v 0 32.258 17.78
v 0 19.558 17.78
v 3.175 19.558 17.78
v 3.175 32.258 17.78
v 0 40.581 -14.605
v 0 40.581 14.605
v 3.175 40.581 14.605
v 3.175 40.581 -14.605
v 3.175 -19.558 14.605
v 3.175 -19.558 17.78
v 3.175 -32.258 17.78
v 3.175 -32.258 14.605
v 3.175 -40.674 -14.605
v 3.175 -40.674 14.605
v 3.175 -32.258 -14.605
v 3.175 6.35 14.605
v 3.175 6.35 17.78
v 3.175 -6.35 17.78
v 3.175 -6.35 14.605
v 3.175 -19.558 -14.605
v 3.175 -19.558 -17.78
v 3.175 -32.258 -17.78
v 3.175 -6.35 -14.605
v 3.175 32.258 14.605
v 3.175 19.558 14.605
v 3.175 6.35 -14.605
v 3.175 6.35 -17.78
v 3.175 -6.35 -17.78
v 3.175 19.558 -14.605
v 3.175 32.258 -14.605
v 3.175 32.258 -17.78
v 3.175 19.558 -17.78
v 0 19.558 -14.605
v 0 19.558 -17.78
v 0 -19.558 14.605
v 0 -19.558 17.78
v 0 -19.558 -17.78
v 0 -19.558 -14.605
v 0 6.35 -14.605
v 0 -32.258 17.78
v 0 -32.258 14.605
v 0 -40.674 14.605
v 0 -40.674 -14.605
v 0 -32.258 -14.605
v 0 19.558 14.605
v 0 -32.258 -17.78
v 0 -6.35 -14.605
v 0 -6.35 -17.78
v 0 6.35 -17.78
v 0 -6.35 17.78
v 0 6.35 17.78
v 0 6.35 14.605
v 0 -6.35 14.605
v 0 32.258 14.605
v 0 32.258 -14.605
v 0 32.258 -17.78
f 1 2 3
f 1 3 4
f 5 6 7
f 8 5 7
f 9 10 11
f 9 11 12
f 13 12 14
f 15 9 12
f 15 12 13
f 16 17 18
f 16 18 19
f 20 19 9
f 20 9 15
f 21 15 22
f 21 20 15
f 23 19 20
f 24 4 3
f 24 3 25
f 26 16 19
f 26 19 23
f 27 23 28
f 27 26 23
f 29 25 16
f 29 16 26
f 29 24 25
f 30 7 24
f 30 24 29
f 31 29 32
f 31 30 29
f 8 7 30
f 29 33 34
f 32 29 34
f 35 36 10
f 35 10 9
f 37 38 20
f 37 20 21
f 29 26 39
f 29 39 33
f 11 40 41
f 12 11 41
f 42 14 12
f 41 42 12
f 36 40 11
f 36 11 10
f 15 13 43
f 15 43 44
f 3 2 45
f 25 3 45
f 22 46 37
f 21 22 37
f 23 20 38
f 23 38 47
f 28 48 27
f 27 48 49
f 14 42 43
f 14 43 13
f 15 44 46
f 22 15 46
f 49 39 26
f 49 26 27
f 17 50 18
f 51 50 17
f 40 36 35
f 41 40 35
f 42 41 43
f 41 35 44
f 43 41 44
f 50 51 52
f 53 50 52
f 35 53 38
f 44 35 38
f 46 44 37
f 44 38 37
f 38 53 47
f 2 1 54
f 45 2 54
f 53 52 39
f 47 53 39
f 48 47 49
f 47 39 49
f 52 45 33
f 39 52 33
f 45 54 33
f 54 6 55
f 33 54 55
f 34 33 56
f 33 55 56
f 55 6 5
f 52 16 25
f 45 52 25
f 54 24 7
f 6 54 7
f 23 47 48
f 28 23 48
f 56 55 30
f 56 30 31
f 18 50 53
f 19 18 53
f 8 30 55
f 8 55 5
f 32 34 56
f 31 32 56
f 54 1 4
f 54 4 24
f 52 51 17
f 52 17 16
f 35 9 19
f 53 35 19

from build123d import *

# Parameters (mm, degrees)
SKETCH1_W          = 35.56
SKETCH1_H          = 90.932
EXTRUDE1_DEPTH     = 3.175
SKETCH2_W          = 3.175
SKETCH2_H          = 13.208
CUT_EXTRUDE1_DEPTH = 4.175
SKETCH3_W          = 3.175
SKETCH3_H          = 4.885047255
SKETCH3_H_2        = 4.792331668
CUT_EXTRUDE2_DEPTH = 33.385


with BuildPart() as part:
    # Sketch1 → Extrude1 (new body)
    with BuildSketch(Plane(origin=(0, 0, 0), x_dir=(0, 0, -1), z_dir=(1, 0, 0))):
        Rectangle(SKETCH1_W, SKETCH1_H)
    extrude(amount=EXTRUDE1_DEPTH)

    # Sketch2 → Cut-Extrude1 (cut, through all)
    with BuildSketch(Plane(origin=(3.175, 0, 0), x_dir=(0, 0, -1), z_dir=(1, 0, 0))):
        with Locations((-16.1925, 38.862)):
            Rectangle(SKETCH2_W, SKETCH2_H)
        with Locations((-16.1925, 12.954)):
            Rectangle(SKETCH2_W, SKETCH2_H)
        with Locations((-16.1925, -12.954)):
            Rectangle(SKETCH2_W, SKETCH2_H)
        with Locations((-16.1925, -38.862)):
            Rectangle(SKETCH2_W, SKETCH2_H)
        with Locations((-16.1925, -64.77)):
            Rectangle(SKETCH2_W, SKETCH2_H)
        with Locations((16.1925, -38.862)):
            Rectangle(SKETCH2_W, SKETCH2_H)
        with Locations((16.1925, -12.954)):
            Rectangle(SKETCH2_W, SKETCH2_H)
        with Locations((16.1925, 12.954)):
            Rectangle(SKETCH2_W, SKETCH2_H)
        with Locations((16.1925, 38.862)):
            Rectangle(SKETCH2_W, SKETCH2_H)
    extrude(amount=-CUT_EXTRUDE1_DEPTH, mode=Mode.SUBTRACT)

    # Sketch3 → Cut-Extrude2 (cut, through all)
    with BuildSketch(Plane.XY.offset(14.605)):
        with Locations((1.5875, 43.023476372)):
            Rectangle(SKETCH3_W, SKETCH3_H)
        with Locations((1.5875, -43.069834166)):
            Rectangle(SKETCH3_W, SKETCH3_H_2)
    extrude(amount=-CUT_EXTRUDE2_DEPTH, mode=Mode.SUBTRACT)


solid = part.part
